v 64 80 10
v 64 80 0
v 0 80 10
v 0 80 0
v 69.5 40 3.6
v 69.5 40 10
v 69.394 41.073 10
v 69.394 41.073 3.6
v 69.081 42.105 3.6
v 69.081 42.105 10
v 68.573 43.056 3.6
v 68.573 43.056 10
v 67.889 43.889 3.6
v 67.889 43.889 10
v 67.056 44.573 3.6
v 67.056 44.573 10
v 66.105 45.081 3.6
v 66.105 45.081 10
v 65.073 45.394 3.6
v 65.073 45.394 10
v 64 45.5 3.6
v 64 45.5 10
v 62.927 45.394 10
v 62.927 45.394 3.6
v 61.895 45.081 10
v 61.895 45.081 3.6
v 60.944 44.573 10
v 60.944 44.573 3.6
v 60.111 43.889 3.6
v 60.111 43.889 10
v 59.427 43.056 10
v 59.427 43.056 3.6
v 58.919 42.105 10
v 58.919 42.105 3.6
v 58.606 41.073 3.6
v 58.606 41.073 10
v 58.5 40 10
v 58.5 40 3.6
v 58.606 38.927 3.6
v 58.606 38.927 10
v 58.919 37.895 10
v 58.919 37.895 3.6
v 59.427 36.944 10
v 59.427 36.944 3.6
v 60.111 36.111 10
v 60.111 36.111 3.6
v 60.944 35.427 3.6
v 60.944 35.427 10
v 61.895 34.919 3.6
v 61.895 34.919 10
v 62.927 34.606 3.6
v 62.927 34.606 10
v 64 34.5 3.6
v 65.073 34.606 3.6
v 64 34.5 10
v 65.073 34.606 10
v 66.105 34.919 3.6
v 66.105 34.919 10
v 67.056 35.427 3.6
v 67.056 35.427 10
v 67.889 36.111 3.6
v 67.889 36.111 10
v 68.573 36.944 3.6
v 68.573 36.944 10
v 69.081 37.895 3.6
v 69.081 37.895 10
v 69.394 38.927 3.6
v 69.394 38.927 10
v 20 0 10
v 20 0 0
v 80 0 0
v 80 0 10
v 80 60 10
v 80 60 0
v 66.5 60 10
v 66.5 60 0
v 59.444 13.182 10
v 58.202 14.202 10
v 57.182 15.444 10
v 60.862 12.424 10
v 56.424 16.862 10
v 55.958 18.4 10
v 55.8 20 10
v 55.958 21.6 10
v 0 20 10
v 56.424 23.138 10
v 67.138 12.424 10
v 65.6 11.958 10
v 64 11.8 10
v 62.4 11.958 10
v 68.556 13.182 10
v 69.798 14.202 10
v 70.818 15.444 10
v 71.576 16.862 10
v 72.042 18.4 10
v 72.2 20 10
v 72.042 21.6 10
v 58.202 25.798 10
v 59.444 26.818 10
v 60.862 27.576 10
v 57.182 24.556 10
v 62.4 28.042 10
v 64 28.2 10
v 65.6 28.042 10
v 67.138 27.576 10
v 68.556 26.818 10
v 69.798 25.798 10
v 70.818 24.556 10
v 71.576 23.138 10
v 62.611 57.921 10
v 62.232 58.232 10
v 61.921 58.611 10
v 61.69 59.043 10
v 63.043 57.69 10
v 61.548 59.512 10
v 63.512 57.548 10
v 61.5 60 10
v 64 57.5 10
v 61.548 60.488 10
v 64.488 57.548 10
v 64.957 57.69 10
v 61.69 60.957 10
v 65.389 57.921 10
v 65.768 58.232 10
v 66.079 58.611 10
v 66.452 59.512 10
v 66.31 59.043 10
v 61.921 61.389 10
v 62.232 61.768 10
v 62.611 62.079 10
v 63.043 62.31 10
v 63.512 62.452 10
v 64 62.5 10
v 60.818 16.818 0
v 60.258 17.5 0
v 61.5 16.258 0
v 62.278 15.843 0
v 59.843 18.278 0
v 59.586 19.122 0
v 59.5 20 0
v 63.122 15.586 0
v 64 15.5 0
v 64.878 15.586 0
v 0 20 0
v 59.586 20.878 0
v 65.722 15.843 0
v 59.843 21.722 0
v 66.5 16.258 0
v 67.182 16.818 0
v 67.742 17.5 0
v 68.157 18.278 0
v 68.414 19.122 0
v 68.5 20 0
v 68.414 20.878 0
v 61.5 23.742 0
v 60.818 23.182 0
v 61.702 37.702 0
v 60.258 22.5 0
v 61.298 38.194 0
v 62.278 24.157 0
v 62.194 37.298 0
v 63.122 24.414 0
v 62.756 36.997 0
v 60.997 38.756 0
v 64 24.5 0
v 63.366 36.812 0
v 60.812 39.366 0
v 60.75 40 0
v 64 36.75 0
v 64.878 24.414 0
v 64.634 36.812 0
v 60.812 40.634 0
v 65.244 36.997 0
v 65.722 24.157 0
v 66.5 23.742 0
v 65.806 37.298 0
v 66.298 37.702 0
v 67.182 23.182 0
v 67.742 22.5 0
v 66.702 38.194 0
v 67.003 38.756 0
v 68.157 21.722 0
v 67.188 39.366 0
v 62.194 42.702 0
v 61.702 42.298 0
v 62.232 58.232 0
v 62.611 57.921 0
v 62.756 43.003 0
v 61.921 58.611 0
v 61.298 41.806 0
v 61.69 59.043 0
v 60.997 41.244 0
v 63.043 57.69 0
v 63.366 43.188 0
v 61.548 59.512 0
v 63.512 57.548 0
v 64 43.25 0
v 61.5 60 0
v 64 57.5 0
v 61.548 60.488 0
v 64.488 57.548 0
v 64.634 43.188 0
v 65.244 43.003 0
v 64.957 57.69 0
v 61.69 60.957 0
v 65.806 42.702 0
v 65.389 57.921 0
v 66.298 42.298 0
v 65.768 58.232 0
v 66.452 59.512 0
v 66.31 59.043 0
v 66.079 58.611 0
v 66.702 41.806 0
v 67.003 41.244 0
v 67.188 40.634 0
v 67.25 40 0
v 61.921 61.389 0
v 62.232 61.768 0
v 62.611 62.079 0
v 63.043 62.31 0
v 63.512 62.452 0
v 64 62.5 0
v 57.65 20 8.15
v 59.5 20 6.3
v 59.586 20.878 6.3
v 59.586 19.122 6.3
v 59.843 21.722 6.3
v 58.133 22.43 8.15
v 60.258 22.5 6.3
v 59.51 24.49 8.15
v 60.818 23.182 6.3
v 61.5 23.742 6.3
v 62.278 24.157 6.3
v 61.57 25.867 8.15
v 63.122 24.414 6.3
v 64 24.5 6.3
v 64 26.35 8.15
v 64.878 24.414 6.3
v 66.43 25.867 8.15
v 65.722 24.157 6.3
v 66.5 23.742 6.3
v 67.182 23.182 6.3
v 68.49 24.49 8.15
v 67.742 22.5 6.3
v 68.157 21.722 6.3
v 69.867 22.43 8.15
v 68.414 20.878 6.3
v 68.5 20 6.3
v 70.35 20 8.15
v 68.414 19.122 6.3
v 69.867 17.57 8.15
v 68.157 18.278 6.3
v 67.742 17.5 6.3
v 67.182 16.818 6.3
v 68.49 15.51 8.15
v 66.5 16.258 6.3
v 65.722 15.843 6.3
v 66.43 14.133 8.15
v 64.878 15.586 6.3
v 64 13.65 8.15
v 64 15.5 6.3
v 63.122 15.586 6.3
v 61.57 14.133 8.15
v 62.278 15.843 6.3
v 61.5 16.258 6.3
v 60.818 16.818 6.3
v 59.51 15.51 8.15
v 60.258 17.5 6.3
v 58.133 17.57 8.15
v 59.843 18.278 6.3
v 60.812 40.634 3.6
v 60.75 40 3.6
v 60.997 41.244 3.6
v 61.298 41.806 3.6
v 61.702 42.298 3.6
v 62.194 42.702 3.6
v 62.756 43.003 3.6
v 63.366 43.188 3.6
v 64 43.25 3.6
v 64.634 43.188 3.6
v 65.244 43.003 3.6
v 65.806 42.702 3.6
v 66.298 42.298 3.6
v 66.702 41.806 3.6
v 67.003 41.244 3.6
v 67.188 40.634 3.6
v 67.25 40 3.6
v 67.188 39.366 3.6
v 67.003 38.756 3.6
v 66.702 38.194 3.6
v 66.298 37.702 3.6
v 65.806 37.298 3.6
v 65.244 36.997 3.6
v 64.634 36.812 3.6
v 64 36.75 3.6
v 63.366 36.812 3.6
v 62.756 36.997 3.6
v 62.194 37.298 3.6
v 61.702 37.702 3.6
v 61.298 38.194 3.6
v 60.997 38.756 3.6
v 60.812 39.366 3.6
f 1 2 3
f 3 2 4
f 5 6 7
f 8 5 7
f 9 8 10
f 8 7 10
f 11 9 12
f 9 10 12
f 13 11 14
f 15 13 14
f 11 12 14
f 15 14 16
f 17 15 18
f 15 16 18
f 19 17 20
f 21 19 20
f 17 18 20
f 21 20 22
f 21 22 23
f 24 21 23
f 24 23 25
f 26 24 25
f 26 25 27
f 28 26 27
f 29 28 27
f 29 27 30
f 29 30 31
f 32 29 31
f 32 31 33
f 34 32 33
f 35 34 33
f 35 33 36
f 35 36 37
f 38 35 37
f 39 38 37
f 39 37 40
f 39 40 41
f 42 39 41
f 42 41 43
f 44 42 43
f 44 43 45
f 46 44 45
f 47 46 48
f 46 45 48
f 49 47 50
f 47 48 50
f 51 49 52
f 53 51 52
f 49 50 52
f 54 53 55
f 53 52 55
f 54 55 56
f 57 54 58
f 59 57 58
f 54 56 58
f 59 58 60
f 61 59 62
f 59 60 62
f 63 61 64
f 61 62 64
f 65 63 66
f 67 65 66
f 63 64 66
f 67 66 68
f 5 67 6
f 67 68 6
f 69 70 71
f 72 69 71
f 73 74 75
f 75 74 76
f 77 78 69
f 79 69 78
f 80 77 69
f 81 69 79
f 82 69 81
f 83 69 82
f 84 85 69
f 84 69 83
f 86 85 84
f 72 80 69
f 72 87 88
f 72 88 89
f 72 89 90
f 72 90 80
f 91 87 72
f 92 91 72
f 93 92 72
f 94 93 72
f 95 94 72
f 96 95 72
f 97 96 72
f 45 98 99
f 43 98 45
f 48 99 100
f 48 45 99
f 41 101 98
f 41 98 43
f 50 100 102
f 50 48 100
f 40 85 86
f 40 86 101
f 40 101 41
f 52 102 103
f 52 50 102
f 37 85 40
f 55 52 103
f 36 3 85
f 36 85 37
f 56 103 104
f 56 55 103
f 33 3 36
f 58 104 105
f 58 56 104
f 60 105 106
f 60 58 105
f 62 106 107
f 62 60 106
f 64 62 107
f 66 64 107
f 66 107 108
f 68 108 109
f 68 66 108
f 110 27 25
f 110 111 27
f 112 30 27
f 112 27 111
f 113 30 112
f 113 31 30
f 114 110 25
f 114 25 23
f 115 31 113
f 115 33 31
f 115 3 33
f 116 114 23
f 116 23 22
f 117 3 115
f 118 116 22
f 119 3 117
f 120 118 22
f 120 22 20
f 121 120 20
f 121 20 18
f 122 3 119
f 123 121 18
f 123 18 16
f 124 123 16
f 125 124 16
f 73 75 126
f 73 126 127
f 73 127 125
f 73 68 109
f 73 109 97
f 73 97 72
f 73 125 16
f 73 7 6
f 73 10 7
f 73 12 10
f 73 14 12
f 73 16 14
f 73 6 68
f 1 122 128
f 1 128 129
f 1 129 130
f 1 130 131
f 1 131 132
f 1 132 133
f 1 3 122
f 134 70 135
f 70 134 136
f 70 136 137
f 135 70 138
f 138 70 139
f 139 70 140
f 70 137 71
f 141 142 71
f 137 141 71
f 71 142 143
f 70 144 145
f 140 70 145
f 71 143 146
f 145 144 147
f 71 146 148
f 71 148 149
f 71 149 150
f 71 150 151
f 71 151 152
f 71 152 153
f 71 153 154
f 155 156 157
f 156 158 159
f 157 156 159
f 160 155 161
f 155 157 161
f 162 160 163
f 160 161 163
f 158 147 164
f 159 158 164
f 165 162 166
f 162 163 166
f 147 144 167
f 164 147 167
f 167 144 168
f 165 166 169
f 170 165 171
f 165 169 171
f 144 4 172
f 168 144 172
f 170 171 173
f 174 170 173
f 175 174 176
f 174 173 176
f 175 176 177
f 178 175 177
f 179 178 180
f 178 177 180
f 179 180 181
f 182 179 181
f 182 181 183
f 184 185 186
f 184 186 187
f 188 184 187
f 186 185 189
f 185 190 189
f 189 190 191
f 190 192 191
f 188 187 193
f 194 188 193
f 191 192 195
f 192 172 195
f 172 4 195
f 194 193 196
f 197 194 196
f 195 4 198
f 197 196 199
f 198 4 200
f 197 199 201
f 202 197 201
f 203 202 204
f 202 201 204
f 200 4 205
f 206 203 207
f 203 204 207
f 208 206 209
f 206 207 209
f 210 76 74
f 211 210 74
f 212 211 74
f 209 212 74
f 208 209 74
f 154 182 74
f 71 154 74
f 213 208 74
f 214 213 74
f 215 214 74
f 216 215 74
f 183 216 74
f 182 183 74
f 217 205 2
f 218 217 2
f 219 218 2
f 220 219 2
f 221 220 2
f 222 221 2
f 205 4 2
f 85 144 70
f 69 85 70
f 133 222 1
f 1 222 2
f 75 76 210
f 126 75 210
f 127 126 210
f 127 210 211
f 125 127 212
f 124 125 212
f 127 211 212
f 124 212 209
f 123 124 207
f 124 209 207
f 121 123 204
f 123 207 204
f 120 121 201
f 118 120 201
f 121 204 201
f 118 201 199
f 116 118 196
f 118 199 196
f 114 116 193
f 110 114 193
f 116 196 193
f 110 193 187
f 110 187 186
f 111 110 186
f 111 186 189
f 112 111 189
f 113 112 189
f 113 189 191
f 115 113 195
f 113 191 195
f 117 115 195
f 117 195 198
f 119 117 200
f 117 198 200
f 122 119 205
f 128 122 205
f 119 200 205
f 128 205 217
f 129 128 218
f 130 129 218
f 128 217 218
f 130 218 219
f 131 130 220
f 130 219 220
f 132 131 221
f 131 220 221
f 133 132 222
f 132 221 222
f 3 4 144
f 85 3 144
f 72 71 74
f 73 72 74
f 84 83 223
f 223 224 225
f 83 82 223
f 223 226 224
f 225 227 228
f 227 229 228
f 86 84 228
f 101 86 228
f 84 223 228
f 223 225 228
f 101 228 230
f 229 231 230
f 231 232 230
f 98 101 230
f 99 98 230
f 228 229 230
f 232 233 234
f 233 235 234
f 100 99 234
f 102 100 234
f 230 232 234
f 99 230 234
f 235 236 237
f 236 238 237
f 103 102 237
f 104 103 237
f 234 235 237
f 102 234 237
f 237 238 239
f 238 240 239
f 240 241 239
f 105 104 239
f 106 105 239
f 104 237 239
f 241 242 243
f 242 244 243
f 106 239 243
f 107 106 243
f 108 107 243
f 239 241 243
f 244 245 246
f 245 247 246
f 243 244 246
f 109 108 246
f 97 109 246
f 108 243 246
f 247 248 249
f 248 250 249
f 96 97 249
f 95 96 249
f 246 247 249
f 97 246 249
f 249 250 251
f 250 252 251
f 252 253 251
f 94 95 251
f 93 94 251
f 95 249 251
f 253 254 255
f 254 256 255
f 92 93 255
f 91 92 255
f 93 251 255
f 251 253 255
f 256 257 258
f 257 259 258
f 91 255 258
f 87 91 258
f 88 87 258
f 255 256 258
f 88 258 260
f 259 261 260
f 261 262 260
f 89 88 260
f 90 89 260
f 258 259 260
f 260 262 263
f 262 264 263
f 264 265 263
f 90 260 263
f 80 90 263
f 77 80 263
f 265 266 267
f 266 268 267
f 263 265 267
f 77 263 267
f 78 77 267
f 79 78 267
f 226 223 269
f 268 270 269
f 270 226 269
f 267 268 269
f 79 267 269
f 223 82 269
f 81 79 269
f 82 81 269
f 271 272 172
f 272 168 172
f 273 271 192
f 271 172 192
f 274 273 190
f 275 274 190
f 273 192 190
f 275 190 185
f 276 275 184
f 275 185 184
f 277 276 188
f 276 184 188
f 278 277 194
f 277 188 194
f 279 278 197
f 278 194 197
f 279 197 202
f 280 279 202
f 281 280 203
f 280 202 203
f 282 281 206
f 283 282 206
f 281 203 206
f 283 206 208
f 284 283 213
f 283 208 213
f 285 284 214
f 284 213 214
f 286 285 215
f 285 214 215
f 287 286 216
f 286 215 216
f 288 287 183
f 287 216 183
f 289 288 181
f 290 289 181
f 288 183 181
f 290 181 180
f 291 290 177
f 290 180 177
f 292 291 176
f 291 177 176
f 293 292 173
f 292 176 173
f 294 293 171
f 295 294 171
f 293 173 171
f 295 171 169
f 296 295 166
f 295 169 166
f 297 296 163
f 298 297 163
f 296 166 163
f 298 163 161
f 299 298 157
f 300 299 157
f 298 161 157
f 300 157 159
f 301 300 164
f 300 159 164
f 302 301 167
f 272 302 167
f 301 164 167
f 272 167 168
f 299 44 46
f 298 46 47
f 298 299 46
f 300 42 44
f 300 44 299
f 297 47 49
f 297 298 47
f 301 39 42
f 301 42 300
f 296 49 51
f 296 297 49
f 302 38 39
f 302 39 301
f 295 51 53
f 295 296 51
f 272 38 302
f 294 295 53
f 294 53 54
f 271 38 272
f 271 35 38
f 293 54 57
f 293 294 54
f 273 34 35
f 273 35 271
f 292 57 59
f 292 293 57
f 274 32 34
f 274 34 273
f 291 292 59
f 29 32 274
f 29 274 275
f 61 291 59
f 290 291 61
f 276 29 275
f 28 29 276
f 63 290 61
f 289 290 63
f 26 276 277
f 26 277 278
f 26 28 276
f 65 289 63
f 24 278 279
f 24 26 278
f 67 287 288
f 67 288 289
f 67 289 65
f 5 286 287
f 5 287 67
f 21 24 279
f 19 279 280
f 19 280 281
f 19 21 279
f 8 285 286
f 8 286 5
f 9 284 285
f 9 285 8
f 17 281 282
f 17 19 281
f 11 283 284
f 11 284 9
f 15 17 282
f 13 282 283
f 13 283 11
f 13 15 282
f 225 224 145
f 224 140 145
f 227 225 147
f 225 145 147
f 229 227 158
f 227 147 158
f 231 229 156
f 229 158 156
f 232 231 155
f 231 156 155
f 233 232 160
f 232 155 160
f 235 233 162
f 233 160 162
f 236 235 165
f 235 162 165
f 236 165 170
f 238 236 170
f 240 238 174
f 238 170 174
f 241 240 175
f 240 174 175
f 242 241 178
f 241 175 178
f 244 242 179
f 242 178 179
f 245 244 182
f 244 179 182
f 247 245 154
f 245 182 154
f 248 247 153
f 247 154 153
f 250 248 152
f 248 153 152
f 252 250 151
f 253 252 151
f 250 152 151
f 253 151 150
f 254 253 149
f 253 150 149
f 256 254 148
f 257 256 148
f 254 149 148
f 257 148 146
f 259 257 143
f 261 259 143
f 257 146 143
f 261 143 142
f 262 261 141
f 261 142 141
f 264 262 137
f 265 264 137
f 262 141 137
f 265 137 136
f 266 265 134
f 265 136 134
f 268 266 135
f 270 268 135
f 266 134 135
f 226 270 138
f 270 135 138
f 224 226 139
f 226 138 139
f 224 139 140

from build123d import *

# Parameters (mm, degrees)
F1_DEPTH       = 10
F3_D           = 9
F3_CSINK_D     = 16.4
F3_CSINK_ANGLE = 90
F4_D           = 6.5
F4_CBORE_D     = 11
F4_CBORE_DEPTH = 6.4


with BuildPart() as f1:
    # F0 (on Top) → F1 (new body)
    with BuildSketch(Plane.XY):
        with BuildLine():
            Line((0, 20), (20, 0))
            Line((20, 0), (80, 0))
            Line((80, 0), (80, 60))
            Line((80, 60), (66.5, 60))
            ThreePointArc((66.5, 60), (62.232233, 58.232233), (64, 62.5))
            Line((64, 62.5), (64, 80))
            Line((64, 80), (0, 80))
            Line((0, 80), (0, 20))
        make_face()
    extrude(amount=F1_DEPTH)

    # F3 (through all)
    with Locations(Plane.XY.offset(10)):
        with Locations((64, 20)):
            CounterSinkHole(F3_D / 2, F3_CSINK_D / 2, counter_sink_angle=F3_CSINK_ANGLE)

    # F4 (through all)
    with Locations(Plane.XY.offset(10)):
        with Locations((64, 40)):
            CounterBoreHole(F4_D / 2, F4_CBORE_D / 2, F4_CBORE_DEPTH)


solid = f1.part
